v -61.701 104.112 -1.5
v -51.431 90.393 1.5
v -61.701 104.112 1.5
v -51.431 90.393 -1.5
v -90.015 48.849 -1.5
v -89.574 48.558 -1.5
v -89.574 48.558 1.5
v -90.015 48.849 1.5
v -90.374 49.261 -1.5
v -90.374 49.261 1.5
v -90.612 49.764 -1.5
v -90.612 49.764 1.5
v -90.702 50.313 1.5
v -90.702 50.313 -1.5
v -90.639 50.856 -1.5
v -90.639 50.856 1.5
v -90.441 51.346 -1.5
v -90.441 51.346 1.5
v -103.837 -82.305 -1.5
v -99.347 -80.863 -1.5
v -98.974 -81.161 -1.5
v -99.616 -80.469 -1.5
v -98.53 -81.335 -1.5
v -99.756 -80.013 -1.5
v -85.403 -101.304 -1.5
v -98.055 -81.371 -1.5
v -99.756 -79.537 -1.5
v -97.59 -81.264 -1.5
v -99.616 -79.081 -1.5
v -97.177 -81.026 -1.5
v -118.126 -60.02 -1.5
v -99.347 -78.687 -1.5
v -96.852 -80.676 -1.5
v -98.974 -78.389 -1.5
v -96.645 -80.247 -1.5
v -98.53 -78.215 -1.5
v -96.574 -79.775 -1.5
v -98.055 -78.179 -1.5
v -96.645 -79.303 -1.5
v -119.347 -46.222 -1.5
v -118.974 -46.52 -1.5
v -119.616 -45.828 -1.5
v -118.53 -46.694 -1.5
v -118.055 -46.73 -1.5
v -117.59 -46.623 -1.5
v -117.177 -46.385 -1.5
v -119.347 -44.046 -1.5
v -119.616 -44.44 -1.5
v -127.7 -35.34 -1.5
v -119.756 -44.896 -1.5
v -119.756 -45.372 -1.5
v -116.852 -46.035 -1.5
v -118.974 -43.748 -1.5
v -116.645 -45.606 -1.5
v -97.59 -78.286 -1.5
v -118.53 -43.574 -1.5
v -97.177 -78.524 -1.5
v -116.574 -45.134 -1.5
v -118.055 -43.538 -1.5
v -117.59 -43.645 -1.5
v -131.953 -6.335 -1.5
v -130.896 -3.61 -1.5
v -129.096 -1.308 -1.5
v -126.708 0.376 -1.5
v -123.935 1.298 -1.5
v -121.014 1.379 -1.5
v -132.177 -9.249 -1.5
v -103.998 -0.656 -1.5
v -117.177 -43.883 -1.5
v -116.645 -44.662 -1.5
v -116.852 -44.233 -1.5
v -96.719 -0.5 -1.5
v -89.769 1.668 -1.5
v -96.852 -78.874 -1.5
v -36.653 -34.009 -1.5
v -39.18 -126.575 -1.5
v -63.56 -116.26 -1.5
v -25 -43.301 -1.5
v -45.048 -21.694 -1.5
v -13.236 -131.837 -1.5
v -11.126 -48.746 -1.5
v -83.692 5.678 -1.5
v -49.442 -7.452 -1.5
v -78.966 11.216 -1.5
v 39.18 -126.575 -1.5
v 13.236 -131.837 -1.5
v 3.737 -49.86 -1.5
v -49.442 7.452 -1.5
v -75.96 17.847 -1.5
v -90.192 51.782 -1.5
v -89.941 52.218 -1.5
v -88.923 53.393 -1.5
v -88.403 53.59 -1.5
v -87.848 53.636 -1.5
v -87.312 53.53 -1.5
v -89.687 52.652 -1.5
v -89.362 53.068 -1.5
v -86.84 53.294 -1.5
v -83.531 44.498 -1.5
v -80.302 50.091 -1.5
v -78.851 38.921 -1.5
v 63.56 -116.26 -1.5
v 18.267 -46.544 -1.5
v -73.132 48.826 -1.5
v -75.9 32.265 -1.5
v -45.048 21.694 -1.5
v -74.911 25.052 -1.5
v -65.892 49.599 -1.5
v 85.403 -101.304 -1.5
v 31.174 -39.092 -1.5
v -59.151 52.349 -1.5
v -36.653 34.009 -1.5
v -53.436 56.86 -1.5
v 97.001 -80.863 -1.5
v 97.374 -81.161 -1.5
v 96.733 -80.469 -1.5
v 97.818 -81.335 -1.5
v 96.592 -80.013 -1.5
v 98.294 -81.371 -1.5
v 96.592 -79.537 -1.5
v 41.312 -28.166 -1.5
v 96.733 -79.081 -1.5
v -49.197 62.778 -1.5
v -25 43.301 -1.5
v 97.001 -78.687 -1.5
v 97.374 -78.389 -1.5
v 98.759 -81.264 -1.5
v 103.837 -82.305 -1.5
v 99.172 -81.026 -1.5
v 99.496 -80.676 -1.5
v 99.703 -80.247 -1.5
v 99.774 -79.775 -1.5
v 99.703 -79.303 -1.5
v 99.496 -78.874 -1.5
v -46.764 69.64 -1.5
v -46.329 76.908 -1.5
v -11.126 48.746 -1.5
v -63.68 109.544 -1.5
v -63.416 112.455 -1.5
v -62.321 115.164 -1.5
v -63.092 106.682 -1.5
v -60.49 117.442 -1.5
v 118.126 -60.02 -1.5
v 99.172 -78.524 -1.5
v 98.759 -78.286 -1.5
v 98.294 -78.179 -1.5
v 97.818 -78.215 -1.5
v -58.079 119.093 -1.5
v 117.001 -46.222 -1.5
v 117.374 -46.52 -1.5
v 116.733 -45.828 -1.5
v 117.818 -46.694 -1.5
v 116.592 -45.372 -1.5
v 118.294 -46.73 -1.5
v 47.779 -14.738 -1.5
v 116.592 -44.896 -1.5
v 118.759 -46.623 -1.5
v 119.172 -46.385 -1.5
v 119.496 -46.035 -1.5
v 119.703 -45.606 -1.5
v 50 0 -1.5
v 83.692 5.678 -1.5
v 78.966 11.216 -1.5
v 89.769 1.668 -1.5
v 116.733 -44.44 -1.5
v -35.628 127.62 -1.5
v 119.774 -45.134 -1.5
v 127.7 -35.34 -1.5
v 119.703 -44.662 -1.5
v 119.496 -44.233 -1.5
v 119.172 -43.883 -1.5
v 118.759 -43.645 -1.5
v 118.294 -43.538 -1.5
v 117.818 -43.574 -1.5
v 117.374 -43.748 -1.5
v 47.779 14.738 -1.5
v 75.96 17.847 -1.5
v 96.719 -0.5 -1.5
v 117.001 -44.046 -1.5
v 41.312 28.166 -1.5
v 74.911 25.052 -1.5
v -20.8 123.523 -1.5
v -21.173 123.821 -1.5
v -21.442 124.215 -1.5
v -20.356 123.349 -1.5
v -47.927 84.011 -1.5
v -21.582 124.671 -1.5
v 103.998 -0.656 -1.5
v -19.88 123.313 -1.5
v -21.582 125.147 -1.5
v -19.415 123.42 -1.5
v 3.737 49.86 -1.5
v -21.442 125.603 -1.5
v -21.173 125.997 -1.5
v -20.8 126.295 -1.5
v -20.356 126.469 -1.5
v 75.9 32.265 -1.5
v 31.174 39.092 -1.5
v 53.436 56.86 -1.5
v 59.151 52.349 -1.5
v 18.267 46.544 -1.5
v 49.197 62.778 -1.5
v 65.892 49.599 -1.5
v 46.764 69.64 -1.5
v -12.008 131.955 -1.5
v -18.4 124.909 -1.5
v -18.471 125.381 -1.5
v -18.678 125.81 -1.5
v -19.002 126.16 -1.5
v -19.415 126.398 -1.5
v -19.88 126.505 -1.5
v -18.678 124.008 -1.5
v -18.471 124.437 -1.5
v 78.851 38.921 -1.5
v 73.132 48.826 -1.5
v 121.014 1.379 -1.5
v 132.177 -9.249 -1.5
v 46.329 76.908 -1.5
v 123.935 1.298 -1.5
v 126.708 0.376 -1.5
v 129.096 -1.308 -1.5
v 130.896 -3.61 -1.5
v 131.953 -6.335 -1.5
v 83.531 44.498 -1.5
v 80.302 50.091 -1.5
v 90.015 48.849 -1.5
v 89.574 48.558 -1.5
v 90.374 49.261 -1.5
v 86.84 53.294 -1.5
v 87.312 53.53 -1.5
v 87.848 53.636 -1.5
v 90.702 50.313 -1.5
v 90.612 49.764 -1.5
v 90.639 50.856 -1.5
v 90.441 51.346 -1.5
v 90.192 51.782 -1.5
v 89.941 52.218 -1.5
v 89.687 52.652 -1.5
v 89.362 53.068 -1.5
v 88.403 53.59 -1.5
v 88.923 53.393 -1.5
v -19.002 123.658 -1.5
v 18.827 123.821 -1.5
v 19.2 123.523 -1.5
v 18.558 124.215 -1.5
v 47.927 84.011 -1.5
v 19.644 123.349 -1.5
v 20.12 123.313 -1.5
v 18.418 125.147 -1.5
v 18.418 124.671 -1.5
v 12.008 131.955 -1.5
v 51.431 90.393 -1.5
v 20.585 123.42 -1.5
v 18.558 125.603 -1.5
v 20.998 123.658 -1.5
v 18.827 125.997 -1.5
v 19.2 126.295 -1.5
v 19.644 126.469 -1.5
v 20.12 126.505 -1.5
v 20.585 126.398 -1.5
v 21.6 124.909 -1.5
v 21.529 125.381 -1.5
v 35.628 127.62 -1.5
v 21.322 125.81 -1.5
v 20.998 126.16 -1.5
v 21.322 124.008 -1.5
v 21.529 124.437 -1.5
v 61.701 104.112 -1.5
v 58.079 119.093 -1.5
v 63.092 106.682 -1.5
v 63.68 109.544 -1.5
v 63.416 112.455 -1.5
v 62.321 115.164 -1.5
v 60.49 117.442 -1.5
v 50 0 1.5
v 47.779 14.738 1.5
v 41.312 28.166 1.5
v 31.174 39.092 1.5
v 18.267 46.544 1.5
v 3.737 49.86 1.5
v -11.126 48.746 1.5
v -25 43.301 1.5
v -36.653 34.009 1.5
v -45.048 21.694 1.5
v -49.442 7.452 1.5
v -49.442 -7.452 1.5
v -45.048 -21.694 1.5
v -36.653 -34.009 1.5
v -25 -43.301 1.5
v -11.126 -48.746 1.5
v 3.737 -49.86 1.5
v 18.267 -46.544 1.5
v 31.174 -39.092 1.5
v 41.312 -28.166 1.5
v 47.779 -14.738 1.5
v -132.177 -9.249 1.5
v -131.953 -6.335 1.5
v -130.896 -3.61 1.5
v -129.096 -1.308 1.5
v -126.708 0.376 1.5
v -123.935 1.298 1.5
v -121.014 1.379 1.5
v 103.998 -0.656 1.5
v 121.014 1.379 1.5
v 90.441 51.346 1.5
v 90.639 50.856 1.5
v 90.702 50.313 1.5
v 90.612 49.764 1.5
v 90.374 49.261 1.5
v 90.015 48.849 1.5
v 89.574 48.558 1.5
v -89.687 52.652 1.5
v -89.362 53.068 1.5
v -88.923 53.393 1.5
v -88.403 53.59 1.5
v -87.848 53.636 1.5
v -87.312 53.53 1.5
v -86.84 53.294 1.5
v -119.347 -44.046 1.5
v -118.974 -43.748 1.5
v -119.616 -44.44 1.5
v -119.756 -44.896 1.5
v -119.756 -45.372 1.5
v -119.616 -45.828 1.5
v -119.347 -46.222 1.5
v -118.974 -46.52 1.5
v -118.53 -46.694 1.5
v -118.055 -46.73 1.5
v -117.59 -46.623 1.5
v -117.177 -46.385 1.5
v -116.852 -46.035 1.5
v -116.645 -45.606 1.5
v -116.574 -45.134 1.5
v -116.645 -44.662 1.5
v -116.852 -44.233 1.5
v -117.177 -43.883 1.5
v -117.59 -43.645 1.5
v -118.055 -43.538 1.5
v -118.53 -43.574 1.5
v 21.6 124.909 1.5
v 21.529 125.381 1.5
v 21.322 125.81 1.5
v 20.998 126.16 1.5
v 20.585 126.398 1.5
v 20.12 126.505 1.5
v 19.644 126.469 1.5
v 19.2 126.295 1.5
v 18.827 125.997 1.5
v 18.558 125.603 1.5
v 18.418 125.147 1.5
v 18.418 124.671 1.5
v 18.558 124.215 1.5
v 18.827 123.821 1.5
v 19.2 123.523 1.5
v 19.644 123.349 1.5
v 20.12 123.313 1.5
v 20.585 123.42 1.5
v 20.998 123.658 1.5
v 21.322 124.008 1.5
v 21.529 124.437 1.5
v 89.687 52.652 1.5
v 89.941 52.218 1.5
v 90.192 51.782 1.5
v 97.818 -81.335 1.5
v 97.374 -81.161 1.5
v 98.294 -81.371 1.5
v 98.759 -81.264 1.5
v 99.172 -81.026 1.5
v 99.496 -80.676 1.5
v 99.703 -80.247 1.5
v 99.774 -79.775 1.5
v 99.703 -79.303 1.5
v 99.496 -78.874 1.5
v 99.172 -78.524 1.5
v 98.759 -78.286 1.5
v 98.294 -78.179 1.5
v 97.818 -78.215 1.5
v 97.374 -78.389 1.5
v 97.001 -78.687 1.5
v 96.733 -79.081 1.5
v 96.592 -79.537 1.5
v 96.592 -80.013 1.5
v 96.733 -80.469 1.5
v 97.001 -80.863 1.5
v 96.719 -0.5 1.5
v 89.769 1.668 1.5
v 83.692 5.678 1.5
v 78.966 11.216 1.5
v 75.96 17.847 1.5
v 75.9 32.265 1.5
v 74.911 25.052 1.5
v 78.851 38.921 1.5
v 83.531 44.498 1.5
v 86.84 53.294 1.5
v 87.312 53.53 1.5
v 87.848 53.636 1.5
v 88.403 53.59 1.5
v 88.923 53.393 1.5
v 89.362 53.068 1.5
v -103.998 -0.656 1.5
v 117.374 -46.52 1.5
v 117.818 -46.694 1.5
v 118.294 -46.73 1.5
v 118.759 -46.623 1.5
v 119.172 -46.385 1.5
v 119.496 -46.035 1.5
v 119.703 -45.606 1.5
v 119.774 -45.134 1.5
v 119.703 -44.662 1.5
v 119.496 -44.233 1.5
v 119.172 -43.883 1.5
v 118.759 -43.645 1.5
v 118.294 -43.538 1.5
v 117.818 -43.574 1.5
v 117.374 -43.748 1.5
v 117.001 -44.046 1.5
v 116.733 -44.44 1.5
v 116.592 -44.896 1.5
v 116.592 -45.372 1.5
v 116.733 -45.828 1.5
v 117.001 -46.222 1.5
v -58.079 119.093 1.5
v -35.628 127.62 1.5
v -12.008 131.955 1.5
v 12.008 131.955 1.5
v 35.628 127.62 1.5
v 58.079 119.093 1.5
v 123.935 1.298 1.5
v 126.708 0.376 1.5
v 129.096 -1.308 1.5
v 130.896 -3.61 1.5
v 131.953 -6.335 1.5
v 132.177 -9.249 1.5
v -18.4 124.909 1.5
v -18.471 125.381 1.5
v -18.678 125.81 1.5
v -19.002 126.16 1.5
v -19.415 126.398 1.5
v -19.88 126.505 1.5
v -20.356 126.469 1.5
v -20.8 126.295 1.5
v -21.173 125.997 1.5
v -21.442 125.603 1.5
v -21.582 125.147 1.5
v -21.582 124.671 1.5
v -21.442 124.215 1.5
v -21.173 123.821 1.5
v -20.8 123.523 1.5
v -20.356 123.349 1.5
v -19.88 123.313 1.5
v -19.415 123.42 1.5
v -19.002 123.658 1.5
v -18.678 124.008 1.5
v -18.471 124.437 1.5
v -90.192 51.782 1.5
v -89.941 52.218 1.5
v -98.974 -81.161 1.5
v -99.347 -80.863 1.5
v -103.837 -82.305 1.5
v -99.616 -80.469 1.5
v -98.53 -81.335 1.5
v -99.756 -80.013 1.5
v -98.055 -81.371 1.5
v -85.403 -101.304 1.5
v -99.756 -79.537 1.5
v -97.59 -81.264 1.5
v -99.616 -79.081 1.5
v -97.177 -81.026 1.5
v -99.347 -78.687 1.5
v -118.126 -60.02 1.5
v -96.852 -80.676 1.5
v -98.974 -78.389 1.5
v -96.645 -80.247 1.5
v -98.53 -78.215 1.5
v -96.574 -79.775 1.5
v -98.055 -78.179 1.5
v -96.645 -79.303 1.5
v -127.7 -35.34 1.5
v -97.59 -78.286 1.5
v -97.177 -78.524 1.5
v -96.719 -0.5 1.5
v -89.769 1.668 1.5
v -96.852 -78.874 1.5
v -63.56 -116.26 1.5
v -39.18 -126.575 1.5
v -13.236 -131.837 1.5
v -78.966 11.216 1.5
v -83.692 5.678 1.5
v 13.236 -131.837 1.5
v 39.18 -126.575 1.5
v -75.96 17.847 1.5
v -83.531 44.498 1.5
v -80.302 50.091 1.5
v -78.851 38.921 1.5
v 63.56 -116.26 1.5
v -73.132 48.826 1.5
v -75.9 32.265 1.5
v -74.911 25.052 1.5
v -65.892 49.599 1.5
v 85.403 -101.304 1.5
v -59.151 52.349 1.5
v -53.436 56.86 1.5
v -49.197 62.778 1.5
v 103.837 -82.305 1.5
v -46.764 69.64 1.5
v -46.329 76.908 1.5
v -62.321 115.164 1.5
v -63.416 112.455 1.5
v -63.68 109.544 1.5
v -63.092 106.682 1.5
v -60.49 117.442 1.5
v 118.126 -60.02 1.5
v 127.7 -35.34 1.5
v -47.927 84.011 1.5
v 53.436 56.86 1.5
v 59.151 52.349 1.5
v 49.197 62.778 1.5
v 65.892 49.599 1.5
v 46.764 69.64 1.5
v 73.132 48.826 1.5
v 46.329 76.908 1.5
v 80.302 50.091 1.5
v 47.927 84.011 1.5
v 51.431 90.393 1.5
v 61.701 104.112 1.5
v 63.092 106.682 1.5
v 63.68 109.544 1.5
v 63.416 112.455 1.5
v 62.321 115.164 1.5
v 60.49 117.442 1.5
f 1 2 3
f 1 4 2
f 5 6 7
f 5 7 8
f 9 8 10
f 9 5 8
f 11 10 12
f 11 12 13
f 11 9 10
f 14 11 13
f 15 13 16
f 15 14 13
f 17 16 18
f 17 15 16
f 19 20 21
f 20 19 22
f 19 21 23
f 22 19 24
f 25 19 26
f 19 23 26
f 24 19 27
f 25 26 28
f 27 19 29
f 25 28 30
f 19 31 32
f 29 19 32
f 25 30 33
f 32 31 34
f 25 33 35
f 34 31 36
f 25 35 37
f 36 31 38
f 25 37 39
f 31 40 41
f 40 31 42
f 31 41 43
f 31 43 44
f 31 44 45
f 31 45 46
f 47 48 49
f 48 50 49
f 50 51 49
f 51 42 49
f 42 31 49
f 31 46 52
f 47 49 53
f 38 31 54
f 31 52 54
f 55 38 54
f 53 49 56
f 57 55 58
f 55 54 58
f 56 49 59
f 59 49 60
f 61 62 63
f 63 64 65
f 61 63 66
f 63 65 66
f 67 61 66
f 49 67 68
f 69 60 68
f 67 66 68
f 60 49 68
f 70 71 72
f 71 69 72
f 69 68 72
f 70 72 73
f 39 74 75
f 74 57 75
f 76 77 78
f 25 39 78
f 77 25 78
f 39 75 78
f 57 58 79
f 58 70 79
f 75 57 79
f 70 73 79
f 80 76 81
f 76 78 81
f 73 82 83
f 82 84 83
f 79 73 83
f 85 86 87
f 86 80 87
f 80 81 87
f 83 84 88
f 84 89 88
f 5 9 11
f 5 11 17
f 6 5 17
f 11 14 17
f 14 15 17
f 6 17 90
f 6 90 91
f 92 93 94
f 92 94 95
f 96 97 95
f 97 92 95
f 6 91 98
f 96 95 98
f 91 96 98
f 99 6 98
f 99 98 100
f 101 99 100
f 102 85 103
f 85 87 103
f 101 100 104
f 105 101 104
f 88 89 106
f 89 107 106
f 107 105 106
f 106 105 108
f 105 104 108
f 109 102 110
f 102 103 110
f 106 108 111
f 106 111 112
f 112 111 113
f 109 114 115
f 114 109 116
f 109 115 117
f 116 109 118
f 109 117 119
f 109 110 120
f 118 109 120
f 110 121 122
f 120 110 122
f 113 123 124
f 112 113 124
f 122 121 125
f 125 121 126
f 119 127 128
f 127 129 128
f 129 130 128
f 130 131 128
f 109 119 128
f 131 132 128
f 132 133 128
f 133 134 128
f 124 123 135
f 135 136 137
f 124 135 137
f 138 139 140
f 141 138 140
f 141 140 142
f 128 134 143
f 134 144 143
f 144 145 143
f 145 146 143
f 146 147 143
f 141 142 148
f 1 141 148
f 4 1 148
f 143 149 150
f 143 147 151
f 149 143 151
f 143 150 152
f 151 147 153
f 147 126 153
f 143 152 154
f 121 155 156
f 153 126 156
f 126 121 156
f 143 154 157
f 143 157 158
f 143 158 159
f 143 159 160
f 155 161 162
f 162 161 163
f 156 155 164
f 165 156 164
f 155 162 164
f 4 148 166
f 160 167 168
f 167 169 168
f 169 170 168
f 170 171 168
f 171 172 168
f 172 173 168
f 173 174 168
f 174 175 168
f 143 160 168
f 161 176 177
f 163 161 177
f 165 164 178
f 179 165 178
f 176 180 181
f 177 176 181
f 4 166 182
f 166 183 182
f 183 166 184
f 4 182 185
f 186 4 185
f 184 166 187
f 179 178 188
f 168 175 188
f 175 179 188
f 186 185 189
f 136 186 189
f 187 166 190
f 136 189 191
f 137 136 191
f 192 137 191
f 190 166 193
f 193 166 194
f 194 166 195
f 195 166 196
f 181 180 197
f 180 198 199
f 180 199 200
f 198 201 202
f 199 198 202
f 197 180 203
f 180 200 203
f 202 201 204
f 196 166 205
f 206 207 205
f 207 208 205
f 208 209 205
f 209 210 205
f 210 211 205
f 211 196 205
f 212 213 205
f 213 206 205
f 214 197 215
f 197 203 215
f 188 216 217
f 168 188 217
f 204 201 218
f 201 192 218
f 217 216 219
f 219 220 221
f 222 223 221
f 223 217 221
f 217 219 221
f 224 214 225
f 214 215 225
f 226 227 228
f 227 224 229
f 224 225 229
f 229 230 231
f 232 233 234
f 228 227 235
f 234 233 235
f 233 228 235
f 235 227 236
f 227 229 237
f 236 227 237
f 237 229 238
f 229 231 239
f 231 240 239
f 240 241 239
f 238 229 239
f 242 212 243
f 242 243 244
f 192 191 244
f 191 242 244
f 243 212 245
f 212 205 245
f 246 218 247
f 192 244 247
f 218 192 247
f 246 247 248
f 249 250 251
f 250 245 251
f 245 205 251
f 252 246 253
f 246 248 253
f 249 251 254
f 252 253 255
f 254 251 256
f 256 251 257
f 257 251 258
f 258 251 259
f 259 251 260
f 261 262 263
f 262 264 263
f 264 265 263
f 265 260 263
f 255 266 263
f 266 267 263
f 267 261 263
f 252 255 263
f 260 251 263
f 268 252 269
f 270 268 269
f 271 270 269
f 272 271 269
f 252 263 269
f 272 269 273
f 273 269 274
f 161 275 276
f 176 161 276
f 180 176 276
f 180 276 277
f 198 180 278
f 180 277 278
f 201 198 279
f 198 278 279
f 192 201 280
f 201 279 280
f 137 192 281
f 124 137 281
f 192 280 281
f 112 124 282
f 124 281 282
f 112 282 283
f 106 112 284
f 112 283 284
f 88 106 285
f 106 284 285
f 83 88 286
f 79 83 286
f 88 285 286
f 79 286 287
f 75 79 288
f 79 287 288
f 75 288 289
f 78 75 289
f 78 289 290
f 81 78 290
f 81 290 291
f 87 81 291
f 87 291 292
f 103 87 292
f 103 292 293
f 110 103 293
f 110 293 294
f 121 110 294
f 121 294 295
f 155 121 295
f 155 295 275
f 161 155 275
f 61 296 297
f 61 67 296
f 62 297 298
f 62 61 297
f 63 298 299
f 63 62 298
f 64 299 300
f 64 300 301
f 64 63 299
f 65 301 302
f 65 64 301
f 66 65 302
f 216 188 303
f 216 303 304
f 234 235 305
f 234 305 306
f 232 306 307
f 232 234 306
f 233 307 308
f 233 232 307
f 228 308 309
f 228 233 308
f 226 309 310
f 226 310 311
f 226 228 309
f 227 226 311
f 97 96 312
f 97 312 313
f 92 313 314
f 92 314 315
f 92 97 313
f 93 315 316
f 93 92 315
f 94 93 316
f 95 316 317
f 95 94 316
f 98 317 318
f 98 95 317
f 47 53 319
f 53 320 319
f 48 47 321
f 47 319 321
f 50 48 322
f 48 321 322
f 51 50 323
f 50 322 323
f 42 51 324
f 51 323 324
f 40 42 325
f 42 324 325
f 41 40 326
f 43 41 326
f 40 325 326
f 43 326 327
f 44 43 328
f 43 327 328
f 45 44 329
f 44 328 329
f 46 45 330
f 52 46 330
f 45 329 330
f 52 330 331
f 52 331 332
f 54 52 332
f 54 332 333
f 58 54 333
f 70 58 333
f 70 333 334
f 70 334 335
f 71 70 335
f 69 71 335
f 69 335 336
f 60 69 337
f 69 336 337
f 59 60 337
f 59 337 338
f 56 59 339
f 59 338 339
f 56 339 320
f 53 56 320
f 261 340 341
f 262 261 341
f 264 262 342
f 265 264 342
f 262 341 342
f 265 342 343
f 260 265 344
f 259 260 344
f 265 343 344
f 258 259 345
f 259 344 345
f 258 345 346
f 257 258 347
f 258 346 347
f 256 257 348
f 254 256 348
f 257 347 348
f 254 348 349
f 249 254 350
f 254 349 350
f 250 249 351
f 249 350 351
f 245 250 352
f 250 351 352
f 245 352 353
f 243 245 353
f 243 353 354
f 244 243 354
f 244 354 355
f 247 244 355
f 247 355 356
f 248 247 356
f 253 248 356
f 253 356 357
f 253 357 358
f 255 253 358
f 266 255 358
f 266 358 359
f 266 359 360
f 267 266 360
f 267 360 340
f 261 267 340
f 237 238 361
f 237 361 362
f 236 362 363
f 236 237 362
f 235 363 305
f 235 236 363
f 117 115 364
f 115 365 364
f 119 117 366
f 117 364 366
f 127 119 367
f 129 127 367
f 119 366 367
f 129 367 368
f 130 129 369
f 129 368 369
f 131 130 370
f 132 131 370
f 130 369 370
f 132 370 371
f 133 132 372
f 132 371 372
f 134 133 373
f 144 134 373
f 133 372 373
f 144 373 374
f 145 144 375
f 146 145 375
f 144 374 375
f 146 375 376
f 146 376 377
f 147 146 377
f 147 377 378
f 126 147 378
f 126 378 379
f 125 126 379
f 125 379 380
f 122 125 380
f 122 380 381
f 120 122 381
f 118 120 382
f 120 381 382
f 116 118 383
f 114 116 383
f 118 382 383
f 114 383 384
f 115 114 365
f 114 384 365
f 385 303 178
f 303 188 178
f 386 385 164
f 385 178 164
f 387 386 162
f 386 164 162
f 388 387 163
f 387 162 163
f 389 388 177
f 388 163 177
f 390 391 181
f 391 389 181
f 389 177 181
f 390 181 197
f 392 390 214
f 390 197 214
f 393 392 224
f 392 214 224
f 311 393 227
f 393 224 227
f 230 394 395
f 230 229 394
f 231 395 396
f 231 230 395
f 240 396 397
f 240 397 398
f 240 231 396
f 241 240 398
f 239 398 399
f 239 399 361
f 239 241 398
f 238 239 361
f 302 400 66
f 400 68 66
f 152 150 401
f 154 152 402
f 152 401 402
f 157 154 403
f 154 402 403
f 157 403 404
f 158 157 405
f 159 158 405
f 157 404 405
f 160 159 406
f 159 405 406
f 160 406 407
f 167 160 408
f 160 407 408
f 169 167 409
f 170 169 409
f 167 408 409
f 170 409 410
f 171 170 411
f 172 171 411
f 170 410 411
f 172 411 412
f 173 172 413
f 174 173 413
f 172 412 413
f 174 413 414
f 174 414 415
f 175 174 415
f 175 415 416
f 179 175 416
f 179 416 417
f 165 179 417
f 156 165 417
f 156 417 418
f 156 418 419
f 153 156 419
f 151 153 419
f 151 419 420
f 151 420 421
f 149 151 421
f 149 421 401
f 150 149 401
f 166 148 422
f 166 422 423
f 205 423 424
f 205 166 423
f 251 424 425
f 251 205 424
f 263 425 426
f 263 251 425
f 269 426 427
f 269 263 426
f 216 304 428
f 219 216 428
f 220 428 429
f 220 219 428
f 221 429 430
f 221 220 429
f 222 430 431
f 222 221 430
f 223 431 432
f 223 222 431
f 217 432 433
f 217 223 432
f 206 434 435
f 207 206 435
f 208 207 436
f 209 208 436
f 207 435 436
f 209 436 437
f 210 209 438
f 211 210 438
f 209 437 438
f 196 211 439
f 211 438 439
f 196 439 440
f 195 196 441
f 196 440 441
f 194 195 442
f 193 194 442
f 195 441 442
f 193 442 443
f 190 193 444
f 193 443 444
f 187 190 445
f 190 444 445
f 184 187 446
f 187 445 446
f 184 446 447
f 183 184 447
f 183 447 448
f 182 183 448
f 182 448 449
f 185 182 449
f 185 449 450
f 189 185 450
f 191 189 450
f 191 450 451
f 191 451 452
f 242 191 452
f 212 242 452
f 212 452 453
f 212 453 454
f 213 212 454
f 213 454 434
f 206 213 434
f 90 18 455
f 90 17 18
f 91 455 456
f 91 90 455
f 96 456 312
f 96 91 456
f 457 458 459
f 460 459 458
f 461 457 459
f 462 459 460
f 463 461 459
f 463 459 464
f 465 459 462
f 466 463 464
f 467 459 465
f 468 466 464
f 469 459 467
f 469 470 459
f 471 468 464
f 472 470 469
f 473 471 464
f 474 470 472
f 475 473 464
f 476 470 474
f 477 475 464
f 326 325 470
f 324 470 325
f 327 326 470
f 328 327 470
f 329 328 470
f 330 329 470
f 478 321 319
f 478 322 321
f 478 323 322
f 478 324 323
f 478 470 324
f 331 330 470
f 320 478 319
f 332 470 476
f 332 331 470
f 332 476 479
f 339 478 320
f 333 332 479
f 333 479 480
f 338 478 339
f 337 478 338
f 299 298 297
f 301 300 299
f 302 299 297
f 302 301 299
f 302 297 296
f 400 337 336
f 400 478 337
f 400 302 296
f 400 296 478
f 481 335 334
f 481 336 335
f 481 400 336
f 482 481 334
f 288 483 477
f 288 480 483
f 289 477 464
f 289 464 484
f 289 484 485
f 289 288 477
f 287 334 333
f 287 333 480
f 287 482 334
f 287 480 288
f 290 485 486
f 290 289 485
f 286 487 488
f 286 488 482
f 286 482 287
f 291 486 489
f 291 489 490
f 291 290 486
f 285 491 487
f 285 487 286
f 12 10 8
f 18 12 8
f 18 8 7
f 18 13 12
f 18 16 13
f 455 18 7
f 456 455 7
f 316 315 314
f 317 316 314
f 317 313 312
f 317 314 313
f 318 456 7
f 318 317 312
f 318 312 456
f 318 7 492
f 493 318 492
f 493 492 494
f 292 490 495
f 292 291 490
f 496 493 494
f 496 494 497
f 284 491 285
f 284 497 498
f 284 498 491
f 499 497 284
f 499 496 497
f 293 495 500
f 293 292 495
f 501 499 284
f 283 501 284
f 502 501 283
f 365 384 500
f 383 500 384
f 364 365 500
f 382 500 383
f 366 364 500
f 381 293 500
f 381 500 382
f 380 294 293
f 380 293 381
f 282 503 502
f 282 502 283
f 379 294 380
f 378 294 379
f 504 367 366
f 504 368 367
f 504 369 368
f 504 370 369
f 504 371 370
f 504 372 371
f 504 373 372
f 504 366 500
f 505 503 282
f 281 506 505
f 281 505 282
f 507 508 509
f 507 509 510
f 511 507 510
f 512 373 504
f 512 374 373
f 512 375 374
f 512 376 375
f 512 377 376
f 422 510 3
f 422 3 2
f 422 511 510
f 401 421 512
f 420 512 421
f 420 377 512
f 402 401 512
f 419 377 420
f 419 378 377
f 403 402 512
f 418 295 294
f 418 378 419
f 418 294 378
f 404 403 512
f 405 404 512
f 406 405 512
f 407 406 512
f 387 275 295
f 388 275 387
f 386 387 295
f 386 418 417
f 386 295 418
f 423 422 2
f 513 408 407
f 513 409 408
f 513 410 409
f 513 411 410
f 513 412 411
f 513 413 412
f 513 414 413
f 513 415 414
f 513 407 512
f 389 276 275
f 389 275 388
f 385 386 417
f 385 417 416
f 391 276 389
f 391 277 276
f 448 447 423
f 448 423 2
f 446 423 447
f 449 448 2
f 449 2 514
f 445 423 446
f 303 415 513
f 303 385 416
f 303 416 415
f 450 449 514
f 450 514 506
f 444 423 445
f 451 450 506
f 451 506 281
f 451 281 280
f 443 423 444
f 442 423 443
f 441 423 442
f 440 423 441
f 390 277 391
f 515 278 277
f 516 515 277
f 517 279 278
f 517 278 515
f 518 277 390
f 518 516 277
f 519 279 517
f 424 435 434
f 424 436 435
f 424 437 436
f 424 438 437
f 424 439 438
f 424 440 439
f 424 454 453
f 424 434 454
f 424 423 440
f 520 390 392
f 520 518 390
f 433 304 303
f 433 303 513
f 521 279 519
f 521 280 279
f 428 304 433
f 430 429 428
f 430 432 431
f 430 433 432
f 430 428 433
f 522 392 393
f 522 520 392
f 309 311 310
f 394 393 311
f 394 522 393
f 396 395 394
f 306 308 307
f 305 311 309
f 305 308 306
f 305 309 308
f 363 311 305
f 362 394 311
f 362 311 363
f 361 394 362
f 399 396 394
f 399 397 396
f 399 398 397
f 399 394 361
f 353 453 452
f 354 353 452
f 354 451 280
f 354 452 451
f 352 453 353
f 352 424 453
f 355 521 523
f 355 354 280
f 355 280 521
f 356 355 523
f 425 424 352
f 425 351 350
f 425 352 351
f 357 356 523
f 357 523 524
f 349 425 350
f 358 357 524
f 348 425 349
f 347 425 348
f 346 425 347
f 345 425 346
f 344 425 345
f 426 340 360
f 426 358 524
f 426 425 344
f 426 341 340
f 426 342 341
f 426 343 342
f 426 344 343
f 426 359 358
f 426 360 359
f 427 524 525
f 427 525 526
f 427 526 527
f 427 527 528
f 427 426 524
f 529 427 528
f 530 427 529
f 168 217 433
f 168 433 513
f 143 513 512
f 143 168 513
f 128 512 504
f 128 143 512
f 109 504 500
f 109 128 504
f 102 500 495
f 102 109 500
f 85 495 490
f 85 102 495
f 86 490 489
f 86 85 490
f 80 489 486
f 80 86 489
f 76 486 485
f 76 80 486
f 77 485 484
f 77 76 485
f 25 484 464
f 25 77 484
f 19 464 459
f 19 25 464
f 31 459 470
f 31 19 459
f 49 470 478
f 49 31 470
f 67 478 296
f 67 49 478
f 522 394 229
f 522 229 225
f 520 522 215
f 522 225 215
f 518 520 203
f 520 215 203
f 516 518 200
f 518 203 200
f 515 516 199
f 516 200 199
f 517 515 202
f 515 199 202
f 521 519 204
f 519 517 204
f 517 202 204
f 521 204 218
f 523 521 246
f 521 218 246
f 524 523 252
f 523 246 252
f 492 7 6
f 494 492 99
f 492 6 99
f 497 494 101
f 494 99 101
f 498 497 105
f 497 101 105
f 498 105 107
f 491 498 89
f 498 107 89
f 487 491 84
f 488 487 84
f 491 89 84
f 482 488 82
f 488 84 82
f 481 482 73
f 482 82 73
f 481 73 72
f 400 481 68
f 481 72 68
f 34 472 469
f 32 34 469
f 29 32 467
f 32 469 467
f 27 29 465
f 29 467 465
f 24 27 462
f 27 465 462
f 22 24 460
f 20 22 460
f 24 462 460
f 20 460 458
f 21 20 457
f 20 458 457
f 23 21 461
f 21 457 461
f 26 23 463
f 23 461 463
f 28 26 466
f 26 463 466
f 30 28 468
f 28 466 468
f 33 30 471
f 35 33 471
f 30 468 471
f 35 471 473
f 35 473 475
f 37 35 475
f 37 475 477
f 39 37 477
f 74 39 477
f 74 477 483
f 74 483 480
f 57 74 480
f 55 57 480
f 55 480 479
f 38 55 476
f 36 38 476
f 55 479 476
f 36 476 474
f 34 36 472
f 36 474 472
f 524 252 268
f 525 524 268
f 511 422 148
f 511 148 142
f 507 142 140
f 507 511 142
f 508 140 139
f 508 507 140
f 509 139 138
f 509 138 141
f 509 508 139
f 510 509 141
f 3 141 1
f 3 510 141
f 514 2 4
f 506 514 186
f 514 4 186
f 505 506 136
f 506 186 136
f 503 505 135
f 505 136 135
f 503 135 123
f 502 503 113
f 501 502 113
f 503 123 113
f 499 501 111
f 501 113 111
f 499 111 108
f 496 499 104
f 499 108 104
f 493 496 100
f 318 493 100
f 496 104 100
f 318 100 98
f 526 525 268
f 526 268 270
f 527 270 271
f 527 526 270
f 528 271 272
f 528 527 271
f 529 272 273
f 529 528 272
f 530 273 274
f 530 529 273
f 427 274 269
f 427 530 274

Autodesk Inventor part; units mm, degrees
ref_plane "YZ Plane" through (0, 0, 0) normal (1, 0, 0) x (0, 1, 0)
ref_plane "XZ Plane" through (0, 0, 0) normal (0, 1, 0) x (-1, 0, 0)
ref_plane "XY Plane" through (0, 0, 0) normal (0, 0, 1) x (1, 0, 0)
sketch "Эскиз1" plane through (0, 0, 0) normal (0, 0, 1) x (1, 0, 0)
  circle A0 centre (0, 0) radius 104 construction
  line L0 (0, 0) -> (0, 166.3327) construction
  line L1 (0, 0) -> (122.2993, 70.6095) construction
  line L2 (0, 0) -> (95.803, 99.2069) construction
  line L3 (0, 0) -> (133.5999, 33.3102) construction
  circle A1 centre (72.2445, 74.8113) radius 26
  circle A2 centre (100.9108, 25.1599) radius 26
  circle A3 centre (0, 0) radius 132.5
  line L4 (51.4307, 90.3929) -> (68.6163, 113.3493)
  line L5 (88.543, 54.554) -> (110.8856, 72.5303)
  line L6 (91.5167, 49.4035) -> (118.2559, 59.7646)
  line L7 (103.9979, -0.6562) -> (132.4715, 2.7488)
  circle A4 centre (-72.2445, 74.8113) radius 26
  circle A5 centre (-100.9108, 25.1599) radius 26
  line L8 (-51.4307, 90.3929) -> (-68.6163, 113.3493)
  line L9 (-88.543, 54.554) -> (-110.8856, 72.5303)
  line L10 (-91.5167, 49.4035) -> (-118.2559, 59.7646)
  line L11 (-103.9979, -0.6562) -> (-132.4715, 2.7488)
  arc A6 (91.5167, 49.4035) -> (88.543, 54.554) centre (0, 0) ccw
  arc A7 (-88.543, 54.554) -> (-91.5167, 49.4035) centre (0, 0) ccw
  point P0 (-68.6163, 113.3493)
  point P1 (-110.8856, 72.5303)
  point P2 (-118.2559, 59.7646)
  point P3 (-132.4715, 2.7488)
  dimension "d0" = 208
  dimension "d1" = 52
  dimension "d2" = 32
  dimension "d3" = 60
  dimension "d4" = 265
extrude "Выдавливание1" add sketch "Эскиз1" along normal mid plane 3 contours A1 A6 A2 L7 A3 L11 A5 A7 A4 L8 L4
fillet "Сопряжение1" radius 10 4 edges at (-68.6163, 113.3493, 0) (-132.4715, 2.7488, 0) (68.6163, 113.3493, 0) (132.4715, 2.7488, 0)
fillet "Сопряжение1" radius 2 4 edges at (88.543, 54.554, 0) (91.5167, 49.4035, 0) (-88.543, 54.554, 0) (-91.5167, 49.4035, 0)
sketch "Эскиз2" plane through (0, 0, 1.5) normal (0, 0, 1) x (1, 0, 0)
  circle A0 centre (20, 124.909) radius 1.95 construction
  circle A1 centre (20, 124.909) radius 1.6
  circle A2 centre (-20, 124.909) radius 1.6
  circle A3 centre (-20, 124.909) radius 1.6 projected
  point P0 (0, 0)
  dimension "d9" = 3.2
extrude "Выдавливание2" cut sketch "Эскиз2" against normal through all
pattern_circular "Круговой массив1" count 3 over 360 about axis through (0, 0, -10) along (0, 0, 1) of "Выдавливание2"
sketch "Эскиз3" plane through (0, 0, 1.5) normal (0, 0, 1) x (1, 0, 0)
  circle A0 centre (0, 0) radius 50
  dimension "d15" = 100
extrude "Выдавливание3" cut sketch "Эскиз3" against normal through all
properties part number "Диск_фиксирующий"
